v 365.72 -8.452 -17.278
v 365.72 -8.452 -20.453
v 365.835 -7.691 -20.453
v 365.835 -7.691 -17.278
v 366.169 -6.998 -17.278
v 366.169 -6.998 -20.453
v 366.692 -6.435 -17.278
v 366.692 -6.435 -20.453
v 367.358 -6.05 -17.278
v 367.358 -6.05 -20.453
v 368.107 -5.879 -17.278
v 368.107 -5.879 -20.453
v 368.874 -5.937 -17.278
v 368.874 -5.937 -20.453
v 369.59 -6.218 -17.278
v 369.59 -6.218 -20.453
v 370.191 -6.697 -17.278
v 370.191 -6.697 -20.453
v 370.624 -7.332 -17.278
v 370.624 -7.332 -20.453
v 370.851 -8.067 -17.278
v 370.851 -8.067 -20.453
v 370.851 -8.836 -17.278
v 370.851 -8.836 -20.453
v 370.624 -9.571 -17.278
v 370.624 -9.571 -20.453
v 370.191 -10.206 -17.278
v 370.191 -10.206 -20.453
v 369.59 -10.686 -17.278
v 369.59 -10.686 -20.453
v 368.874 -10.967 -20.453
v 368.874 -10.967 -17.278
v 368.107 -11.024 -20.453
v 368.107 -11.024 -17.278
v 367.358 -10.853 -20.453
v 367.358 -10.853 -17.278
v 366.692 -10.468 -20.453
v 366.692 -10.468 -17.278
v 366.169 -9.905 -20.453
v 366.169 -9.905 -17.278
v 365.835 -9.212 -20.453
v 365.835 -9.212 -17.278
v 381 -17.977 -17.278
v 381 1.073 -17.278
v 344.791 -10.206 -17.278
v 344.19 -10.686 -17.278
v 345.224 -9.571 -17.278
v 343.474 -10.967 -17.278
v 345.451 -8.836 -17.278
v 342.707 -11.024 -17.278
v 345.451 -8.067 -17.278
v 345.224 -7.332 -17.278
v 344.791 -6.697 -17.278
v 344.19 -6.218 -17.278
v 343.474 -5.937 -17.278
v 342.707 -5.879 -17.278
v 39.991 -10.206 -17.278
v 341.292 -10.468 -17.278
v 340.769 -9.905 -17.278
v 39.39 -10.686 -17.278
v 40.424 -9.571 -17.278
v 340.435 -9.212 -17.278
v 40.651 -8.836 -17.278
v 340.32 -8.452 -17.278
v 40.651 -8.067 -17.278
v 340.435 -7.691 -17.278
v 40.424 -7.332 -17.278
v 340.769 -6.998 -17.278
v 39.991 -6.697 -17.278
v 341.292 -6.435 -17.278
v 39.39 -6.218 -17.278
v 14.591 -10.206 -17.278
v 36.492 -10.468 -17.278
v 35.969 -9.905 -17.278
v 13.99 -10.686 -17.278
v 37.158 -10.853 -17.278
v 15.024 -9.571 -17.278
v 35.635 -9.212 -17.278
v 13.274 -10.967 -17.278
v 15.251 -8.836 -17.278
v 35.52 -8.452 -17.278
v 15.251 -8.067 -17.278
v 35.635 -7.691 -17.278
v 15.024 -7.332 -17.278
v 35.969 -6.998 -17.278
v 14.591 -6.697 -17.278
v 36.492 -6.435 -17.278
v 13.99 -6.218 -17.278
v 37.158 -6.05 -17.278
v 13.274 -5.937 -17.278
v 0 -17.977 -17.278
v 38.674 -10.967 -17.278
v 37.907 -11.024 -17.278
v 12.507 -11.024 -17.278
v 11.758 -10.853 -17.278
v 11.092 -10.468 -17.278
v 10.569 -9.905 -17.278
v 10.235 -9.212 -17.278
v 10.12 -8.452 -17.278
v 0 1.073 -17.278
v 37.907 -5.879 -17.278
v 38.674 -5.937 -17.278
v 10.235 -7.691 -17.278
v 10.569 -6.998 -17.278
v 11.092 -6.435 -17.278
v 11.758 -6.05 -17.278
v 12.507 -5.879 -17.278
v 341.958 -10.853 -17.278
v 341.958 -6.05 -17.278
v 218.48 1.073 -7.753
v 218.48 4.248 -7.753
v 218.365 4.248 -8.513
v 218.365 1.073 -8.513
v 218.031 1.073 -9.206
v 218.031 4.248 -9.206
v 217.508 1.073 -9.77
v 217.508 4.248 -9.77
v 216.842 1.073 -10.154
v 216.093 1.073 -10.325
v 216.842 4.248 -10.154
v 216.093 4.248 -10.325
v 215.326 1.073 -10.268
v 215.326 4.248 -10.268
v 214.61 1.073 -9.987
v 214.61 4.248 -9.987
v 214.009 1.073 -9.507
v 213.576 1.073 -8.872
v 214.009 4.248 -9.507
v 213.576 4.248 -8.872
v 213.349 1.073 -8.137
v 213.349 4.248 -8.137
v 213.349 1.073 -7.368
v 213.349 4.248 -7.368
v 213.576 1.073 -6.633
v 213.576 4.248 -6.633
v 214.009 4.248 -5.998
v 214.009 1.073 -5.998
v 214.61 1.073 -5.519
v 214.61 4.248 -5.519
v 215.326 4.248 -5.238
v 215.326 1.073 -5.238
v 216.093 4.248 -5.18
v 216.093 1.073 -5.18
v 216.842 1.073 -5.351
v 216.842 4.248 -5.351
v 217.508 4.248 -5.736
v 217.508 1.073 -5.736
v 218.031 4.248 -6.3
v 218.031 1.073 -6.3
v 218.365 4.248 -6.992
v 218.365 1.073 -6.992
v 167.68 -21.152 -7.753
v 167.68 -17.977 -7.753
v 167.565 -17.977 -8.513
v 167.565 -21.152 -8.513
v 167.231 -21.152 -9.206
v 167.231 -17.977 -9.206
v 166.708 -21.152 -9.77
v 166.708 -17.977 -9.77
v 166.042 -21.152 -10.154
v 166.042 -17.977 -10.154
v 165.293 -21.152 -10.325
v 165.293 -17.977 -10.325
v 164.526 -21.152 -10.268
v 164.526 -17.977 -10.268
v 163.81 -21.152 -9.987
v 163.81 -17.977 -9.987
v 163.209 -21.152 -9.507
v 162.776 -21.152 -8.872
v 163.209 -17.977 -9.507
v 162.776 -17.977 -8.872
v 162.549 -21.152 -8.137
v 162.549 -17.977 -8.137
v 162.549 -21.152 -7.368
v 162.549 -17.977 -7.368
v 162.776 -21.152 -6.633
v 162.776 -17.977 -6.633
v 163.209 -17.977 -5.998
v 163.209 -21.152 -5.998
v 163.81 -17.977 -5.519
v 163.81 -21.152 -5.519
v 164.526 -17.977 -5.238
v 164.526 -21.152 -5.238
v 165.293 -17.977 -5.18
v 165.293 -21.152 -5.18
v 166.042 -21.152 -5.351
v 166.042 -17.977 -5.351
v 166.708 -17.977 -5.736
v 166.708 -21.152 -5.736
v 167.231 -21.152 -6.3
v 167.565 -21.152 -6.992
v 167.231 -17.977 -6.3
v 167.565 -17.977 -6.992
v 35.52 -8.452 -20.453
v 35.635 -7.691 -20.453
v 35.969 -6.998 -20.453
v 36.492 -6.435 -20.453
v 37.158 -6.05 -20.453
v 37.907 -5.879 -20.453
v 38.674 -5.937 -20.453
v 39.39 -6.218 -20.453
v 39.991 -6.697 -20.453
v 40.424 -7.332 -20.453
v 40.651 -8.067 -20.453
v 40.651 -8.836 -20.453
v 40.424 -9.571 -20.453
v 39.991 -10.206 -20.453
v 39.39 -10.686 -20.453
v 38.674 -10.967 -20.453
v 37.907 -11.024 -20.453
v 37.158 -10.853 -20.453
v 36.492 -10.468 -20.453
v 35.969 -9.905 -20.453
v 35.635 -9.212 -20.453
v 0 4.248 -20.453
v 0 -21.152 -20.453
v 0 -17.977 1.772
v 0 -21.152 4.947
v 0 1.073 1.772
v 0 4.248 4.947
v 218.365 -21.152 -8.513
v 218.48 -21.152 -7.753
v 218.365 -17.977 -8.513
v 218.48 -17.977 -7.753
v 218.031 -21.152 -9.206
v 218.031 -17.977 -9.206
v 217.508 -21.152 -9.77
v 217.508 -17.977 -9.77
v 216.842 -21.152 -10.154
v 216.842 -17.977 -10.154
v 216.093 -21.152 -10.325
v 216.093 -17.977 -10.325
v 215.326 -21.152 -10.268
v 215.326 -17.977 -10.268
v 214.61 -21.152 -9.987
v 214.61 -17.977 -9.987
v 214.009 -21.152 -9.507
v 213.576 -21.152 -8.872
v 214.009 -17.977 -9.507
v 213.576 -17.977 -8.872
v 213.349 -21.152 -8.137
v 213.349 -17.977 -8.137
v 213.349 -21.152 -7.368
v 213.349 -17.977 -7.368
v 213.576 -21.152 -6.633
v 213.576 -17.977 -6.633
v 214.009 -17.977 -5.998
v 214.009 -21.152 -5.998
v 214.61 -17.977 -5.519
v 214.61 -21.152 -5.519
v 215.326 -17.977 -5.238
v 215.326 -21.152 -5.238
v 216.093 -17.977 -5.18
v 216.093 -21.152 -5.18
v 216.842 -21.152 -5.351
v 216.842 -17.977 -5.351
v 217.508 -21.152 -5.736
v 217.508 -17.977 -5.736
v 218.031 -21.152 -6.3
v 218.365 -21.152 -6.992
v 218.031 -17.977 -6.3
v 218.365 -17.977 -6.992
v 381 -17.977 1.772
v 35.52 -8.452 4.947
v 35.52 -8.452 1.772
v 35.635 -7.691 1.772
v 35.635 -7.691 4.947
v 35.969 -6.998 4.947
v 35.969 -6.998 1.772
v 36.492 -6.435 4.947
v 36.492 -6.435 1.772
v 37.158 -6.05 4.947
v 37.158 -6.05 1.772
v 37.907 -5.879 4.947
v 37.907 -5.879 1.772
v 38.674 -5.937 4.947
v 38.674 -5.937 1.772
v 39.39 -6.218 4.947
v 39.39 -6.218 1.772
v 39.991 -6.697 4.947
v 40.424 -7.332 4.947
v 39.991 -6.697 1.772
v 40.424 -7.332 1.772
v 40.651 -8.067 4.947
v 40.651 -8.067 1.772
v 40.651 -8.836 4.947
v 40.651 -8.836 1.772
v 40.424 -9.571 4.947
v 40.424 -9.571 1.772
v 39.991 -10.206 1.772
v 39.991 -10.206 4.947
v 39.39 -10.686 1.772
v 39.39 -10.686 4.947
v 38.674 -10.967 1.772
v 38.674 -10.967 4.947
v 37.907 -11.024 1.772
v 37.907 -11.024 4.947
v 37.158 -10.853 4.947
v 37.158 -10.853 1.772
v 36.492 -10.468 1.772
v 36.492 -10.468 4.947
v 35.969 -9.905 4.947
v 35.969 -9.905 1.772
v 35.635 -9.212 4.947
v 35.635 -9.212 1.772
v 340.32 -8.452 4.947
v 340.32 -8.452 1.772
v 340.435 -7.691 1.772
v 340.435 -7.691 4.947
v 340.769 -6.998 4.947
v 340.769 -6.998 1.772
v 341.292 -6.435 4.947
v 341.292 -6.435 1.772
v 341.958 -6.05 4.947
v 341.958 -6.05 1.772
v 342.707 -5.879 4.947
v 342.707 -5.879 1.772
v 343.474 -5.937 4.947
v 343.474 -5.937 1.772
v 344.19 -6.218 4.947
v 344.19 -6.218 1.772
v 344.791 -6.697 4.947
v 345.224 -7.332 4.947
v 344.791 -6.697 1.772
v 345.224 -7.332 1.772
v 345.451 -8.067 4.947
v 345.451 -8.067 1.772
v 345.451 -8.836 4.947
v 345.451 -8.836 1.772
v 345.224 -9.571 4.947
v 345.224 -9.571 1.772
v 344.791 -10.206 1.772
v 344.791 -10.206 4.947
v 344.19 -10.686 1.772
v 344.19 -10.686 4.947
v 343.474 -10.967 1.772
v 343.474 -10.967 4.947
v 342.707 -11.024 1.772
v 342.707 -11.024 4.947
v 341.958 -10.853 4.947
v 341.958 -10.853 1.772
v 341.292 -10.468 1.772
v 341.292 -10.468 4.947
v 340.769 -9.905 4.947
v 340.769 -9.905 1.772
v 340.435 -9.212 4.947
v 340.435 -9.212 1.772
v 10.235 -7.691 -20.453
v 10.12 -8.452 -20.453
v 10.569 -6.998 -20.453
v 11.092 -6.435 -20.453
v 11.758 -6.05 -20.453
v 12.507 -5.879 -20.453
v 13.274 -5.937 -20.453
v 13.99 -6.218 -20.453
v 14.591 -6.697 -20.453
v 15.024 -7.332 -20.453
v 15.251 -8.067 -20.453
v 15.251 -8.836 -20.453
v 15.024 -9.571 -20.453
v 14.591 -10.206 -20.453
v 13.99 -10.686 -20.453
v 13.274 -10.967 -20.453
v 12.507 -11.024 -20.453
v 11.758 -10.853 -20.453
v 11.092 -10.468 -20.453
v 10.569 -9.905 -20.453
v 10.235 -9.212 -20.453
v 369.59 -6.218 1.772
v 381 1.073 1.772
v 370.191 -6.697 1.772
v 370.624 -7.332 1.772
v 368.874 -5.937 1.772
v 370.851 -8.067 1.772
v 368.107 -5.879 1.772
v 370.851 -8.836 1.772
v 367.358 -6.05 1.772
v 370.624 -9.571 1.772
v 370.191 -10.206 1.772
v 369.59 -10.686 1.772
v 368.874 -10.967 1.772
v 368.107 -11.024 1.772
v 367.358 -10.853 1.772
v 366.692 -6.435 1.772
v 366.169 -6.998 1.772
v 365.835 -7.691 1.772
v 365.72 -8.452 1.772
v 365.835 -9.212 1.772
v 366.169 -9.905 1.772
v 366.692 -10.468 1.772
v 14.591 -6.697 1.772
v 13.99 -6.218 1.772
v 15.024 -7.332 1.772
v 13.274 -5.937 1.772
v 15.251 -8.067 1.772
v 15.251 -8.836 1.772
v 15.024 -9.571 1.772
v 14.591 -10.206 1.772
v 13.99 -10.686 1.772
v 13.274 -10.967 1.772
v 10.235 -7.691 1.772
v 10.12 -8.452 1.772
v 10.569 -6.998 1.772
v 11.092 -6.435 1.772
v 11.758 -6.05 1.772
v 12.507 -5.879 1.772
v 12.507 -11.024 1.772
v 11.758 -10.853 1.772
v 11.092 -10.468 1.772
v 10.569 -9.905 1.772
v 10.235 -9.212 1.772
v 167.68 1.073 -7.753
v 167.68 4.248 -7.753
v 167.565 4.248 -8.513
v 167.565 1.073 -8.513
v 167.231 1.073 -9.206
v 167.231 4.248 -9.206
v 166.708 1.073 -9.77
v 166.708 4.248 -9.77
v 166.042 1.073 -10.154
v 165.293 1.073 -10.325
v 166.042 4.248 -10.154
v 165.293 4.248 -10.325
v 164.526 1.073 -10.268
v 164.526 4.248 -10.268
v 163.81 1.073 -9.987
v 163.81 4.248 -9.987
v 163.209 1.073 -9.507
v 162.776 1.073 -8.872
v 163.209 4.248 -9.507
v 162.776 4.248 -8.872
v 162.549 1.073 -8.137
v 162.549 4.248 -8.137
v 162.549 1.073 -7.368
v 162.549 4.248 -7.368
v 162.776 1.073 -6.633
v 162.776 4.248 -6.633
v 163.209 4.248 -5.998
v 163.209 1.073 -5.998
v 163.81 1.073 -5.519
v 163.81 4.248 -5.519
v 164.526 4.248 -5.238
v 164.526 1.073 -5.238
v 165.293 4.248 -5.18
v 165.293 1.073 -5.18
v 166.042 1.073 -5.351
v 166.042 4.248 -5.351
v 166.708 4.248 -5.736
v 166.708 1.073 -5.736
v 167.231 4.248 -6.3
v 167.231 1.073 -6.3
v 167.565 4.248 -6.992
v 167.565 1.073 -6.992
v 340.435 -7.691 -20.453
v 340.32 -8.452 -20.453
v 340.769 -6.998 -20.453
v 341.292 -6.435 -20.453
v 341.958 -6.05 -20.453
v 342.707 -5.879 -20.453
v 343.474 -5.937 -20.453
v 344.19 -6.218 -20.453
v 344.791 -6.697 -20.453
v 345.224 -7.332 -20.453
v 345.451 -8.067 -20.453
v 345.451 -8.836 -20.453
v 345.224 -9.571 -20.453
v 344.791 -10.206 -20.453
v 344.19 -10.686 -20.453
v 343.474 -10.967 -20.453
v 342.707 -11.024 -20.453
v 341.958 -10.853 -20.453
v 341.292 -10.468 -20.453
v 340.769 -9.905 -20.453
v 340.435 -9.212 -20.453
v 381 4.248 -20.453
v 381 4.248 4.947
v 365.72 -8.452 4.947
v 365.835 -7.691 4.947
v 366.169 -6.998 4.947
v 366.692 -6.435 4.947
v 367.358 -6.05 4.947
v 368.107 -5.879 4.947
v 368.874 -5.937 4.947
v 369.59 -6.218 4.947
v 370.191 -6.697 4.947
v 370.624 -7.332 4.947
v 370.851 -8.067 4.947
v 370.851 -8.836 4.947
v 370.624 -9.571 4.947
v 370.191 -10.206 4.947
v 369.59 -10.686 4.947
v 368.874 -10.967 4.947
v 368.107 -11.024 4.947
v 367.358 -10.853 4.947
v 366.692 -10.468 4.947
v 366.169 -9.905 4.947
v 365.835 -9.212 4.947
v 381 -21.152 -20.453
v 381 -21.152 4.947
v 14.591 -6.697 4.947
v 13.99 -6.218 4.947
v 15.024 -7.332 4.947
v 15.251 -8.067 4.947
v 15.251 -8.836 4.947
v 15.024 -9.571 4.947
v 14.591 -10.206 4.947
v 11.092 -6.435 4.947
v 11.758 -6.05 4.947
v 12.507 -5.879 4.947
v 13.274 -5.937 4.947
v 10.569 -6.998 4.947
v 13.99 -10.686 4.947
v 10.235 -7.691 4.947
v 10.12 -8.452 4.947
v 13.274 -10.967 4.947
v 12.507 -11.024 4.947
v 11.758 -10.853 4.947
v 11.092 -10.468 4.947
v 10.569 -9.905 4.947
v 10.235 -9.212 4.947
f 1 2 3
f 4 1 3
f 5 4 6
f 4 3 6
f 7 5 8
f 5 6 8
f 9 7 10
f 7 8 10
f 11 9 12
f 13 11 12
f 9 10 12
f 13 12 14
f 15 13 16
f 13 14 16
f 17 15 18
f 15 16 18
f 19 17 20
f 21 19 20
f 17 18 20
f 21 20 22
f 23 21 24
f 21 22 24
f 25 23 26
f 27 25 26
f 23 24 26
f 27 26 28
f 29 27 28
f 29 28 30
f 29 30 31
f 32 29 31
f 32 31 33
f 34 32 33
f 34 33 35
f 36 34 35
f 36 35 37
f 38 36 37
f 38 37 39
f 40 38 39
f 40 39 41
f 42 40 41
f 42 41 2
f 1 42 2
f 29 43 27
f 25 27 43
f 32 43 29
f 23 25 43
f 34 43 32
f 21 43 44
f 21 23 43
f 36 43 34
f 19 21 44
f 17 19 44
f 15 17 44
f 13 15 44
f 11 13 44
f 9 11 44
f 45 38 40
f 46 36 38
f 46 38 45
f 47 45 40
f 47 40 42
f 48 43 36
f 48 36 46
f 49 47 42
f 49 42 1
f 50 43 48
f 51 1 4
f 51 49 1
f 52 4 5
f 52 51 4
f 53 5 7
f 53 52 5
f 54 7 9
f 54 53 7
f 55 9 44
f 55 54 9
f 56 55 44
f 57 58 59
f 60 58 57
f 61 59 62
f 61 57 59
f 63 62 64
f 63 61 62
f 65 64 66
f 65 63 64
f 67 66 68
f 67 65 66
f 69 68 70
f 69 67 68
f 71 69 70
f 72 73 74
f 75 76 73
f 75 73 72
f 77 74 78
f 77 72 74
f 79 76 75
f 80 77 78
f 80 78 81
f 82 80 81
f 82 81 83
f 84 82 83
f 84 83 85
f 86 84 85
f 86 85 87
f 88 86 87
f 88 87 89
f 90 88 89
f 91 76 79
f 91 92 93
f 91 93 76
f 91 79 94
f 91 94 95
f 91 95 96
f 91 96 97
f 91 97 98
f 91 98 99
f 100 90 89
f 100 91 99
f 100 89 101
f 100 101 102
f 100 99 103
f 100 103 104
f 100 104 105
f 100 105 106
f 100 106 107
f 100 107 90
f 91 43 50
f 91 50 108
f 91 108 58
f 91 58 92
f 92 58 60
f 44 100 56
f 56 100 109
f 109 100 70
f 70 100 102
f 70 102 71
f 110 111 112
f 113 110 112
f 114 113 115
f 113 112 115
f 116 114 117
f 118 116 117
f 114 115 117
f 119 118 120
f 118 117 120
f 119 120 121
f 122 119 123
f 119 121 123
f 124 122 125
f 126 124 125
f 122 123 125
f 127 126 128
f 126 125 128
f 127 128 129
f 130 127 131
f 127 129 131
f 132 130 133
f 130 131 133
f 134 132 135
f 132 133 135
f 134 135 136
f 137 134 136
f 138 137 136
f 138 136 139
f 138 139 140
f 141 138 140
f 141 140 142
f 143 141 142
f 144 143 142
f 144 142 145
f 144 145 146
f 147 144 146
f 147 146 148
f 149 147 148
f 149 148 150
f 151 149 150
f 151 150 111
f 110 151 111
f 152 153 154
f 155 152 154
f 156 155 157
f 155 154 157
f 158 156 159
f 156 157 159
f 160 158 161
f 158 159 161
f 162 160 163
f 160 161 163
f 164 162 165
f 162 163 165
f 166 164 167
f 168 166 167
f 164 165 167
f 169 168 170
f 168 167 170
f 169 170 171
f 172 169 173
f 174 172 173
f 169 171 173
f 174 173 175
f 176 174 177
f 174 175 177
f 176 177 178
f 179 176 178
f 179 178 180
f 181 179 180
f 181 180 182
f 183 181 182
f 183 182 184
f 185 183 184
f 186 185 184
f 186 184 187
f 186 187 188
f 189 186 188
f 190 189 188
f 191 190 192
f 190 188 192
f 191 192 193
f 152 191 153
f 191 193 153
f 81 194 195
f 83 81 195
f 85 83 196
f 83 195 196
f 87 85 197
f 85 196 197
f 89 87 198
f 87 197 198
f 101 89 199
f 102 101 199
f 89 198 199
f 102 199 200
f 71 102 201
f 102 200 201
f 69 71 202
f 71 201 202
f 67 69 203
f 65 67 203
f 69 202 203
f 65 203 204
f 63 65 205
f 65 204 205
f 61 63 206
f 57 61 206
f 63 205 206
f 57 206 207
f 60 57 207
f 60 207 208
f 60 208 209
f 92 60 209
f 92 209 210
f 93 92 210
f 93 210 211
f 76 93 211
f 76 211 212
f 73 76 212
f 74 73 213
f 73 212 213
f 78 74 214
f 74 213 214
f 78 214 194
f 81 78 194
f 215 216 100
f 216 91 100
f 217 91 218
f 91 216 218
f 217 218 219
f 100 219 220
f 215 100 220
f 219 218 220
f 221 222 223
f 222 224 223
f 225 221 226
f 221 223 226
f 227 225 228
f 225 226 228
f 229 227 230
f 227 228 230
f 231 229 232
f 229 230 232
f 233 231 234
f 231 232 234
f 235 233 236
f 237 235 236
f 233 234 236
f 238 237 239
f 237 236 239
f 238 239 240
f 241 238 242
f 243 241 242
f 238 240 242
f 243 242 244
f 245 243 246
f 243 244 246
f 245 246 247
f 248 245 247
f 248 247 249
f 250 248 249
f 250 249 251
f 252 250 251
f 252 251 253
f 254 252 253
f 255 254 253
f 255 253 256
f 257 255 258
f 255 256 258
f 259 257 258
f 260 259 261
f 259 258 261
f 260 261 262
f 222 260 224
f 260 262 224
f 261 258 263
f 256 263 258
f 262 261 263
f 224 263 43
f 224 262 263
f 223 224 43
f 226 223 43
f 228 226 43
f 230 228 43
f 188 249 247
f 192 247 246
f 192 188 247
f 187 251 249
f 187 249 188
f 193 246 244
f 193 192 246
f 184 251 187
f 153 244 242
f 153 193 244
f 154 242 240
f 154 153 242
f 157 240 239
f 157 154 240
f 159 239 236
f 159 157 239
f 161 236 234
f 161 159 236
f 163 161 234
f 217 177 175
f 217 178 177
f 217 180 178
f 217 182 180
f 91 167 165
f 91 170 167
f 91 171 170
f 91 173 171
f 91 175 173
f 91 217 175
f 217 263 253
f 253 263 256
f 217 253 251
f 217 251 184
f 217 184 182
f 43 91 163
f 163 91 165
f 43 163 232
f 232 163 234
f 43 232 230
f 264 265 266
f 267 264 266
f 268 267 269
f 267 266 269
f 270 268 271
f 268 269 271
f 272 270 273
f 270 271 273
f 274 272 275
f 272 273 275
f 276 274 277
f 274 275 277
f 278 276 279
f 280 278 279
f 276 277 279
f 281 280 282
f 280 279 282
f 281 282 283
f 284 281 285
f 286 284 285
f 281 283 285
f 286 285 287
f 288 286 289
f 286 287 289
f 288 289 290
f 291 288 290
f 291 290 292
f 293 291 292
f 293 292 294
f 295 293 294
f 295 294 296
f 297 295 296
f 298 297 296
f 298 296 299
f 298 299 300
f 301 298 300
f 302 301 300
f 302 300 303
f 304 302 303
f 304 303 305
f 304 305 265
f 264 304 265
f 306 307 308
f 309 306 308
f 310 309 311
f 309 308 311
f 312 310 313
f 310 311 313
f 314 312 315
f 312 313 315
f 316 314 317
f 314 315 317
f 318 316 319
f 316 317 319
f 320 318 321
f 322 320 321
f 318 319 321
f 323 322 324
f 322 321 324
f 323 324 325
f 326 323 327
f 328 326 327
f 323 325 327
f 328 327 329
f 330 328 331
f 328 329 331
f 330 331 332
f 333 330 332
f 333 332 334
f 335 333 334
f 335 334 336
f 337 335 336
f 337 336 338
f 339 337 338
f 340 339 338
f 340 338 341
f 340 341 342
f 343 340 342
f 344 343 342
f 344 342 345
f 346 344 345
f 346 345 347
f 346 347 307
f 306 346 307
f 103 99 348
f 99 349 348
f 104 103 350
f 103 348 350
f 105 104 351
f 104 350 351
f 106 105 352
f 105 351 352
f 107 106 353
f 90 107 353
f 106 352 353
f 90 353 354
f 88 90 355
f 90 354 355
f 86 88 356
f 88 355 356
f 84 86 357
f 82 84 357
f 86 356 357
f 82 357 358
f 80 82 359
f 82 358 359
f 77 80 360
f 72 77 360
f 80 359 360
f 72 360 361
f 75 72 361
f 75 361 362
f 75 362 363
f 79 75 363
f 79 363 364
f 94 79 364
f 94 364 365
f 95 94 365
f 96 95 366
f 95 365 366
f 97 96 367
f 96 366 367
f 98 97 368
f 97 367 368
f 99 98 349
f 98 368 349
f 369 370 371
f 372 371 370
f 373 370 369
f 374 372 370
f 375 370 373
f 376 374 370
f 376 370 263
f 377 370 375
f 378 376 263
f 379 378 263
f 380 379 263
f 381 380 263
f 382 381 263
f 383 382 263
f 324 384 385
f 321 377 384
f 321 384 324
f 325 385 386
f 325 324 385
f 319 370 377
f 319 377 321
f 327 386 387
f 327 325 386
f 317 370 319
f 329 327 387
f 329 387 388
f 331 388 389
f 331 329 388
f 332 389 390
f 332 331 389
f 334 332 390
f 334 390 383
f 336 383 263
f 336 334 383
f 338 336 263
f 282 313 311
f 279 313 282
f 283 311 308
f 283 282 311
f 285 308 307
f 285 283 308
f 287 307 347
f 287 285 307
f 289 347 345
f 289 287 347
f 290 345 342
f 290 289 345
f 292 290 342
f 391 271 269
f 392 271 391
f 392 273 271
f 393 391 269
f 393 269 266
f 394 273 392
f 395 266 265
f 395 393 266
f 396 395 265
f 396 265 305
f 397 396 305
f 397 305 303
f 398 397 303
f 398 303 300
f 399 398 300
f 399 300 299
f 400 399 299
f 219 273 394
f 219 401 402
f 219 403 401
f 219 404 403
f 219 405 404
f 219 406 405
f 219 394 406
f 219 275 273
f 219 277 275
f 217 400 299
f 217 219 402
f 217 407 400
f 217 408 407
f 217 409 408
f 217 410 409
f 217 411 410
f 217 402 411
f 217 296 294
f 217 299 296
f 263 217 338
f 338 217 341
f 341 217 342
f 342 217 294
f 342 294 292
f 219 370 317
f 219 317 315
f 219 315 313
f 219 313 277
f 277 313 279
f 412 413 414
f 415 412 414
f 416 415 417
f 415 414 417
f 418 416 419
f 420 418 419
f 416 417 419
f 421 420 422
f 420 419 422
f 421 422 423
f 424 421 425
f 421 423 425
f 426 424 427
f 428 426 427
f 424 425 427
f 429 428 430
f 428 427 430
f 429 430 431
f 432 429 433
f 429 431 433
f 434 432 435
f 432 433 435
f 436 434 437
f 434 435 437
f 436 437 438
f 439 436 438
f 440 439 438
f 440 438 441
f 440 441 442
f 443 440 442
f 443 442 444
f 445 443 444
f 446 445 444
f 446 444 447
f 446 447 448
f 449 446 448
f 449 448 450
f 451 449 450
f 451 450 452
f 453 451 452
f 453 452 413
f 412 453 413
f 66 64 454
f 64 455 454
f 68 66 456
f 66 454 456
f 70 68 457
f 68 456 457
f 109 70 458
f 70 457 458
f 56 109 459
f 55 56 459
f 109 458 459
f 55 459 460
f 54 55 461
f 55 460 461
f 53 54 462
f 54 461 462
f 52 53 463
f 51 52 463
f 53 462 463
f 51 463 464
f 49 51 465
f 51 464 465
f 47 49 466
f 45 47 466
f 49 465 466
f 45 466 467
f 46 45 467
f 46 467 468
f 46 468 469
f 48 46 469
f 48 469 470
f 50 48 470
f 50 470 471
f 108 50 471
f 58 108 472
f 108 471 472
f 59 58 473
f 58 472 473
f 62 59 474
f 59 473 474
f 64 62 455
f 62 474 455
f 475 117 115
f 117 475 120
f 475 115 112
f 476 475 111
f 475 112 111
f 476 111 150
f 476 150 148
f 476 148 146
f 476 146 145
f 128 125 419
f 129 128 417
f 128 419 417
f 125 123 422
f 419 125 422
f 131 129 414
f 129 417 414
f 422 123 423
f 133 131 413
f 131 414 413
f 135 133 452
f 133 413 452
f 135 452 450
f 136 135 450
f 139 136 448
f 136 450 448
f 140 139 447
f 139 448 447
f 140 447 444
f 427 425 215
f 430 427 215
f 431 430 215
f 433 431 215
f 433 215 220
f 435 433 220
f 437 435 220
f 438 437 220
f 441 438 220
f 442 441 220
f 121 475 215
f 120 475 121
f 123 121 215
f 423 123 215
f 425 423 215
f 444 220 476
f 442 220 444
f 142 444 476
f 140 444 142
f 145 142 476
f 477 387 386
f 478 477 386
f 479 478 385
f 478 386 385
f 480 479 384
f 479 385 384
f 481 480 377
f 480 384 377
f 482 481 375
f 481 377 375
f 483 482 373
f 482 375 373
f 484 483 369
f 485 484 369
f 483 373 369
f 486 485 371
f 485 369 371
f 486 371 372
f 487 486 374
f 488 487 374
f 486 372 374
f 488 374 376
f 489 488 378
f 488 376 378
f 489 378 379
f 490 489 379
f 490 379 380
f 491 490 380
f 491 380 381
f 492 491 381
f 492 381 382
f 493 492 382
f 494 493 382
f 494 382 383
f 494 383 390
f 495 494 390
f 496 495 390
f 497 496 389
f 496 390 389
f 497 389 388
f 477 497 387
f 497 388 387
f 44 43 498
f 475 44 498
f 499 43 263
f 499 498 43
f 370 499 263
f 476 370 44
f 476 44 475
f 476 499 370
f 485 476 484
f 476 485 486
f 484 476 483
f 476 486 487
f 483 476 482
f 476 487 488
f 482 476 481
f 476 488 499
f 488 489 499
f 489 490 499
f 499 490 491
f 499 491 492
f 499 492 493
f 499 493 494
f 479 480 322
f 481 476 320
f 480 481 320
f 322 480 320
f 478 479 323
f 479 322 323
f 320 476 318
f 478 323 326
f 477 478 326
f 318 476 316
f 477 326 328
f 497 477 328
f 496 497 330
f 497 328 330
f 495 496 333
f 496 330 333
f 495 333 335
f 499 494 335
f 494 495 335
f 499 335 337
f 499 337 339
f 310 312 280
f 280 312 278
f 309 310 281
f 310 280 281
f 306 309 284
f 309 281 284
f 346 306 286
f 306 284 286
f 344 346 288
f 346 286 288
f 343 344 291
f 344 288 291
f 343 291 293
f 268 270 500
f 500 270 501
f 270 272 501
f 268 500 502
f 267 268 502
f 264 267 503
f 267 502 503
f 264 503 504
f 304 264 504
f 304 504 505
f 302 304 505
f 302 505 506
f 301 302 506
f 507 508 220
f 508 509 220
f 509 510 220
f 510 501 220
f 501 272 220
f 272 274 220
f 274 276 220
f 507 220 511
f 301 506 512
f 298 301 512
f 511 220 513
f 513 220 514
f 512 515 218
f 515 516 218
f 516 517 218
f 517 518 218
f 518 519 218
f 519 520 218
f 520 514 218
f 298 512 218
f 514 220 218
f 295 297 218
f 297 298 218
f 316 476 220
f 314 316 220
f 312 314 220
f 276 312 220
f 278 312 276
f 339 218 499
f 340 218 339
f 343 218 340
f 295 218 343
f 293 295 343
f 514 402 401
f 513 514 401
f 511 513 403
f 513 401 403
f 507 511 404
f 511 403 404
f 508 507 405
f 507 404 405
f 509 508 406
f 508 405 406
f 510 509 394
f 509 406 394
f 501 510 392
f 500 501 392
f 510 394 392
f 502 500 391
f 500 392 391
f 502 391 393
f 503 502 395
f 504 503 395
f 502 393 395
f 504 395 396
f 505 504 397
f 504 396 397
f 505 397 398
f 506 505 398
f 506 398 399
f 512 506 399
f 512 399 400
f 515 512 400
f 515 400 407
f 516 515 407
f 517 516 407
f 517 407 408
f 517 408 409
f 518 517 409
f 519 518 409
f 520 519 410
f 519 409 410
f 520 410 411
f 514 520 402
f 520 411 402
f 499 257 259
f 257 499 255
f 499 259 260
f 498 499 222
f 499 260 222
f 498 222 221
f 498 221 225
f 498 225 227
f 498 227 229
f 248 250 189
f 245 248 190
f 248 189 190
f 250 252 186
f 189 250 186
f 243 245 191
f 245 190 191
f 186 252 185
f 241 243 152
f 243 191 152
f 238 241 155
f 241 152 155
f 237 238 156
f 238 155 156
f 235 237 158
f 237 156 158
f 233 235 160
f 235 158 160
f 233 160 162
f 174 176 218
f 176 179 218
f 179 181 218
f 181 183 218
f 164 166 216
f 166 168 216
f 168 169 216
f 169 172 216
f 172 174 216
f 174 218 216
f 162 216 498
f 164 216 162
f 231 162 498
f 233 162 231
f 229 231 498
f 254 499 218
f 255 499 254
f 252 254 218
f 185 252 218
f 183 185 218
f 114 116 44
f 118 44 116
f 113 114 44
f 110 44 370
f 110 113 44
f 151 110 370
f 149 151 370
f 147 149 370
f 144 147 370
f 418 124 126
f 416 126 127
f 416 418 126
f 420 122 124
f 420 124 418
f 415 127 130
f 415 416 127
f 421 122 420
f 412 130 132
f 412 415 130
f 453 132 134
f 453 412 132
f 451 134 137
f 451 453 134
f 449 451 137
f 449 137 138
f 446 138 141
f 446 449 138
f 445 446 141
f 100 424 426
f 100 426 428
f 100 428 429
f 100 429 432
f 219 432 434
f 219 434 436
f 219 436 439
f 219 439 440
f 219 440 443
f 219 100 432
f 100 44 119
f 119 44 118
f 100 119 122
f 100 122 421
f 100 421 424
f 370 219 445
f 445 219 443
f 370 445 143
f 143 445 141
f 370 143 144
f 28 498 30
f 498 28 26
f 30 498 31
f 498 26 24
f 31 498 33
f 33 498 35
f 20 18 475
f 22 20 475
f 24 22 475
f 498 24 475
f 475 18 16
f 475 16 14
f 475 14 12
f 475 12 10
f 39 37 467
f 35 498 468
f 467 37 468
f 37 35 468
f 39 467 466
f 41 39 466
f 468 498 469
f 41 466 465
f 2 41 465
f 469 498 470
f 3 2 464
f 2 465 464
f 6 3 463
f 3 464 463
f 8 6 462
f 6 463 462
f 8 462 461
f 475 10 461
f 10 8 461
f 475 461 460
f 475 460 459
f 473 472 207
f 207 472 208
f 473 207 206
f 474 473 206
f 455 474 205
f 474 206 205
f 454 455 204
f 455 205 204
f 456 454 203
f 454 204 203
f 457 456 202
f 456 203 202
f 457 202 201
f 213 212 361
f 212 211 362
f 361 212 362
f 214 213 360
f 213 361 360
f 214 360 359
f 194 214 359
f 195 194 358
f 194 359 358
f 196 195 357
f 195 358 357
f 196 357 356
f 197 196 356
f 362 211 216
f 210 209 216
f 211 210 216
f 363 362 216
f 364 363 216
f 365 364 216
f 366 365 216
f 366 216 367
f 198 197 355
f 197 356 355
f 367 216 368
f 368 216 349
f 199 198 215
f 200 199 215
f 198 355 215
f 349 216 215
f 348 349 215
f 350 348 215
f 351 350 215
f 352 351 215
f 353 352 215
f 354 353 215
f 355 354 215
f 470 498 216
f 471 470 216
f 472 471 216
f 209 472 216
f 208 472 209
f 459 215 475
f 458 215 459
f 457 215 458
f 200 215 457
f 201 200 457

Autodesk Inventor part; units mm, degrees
ref_plane "YZ Plane" through (0, 0, 0) normal (1, 0, 0) x (0, 1, 0)
ref_plane "XZ Plane" through (0, 0, 0) normal (0, 1, 0) x (-1, 0, 0)
ref_plane "XY Plane" through (0, 0, 0) normal (0, 0, 1) x (1, 0, 0)
sketch "Sketch1" plane through (0, 0, 0) normal (1, 0, 0) x (0, 1, 0)
  line L0 (4.2484, 4.9473) -> (-21.1516, 4.9473)
  line L1 (-21.1516, 4.9473) -> (-21.1516, -20.4527)
  line L2 (-21.1516, -20.4527) -> (4.2484, -20.4527)
  line L3 (4.2484, -20.4527) -> (4.2484, 4.9473)
  line L4 (1.0734, 1.7723) -> (-17.9766, 1.7723)
  line L5 (-17.9766, 1.7723) -> (-17.9766, -17.2777)
  line L6 (-17.9766, -17.2777) -> (1.0734, -17.2777)
  line L7 (1.0734, -17.2777) -> (1.0734, 1.7723)
  point P0 (0, 0)
  dimension "d0" = 25.4
  dimension "d1" = 25.4
  dimension "d2" = 3.175
extrude "Extrusion1" add sketch "Sketch1" along normal blind 381
sketch "Sketch2" plane through (0, -21.1516, -20.4527) normal (0, 0, -1) x (-1, 0, 0)
  line L0 (0, 0) -> (0, 25.4) construction
  line L1 (0, 12.7) -> (-12.7, 12.7) construction
  line L2 (-12.7, 12.7) -> (-38.1, 12.7) construction
  line L3 (-381, 0) -> (-381, 25.4) construction
  line L4 (-381, 12.7) -> (-368.3, 12.7) construction
  line L5 (-368.3, 12.7) -> (-342.9, 12.7) construction
  circle A0 centre (-368.3, 12.7) radius 2.5797
  circle A1 centre (-342.9, 12.7) radius 2.5797
  circle A2 centre (-12.7, 12.7) radius 2.5797
  circle A3 centre (-38.1, 12.7) radius 2.5797
  point P0 (0, 21.1516)
  dimension "d5" = 12.7
  dimension "d6" = 25.4
  dimension "d7" = 12.7
  dimension "d8" = 25.4
  dimension "d9" = 5.1594
  dimension "d10" = 5.1594
  dimension "d11" = 5.1594
  dimension "d12" = 5.1594
extrude "Extrusion2" cut sketch "Sketch2" against normal blind 431.8
sketch "Sketch3" plane through (0, 4.2484, 4.9473) normal (0, 1, 0) x (1, 0, 0)
  line L0 (0, 25.4) -> (381, 25.4) construction
  line L1 (190.5, 25.4) -> (190.5, 12.7) construction
  line L2 (190.5, 25.4) -> (203.2, 25.4) construction
  line L3 (190.5, 12.7) -> (215.9, 12.7) construction
  line L4 (215.9, 12.7) -> (165.1, 12.7) construction
  circle A0 centre (165.1, 12.7) radius 2.5797
  circle A1 centre (215.9, 12.7) radius 2.5797
  point P0 (0, 4.9473)
  dimension "d15" = 12.7
  dimension "d16" = 90
  dimension "d17" = 25.4
  dimension "d18" = 50.8
  dimension "d19" = 5.1594
extrude "Extrusion3" cut sketch "Sketch3" against normal blind 77.7875
properties part number "17in 1x1 Beam"
